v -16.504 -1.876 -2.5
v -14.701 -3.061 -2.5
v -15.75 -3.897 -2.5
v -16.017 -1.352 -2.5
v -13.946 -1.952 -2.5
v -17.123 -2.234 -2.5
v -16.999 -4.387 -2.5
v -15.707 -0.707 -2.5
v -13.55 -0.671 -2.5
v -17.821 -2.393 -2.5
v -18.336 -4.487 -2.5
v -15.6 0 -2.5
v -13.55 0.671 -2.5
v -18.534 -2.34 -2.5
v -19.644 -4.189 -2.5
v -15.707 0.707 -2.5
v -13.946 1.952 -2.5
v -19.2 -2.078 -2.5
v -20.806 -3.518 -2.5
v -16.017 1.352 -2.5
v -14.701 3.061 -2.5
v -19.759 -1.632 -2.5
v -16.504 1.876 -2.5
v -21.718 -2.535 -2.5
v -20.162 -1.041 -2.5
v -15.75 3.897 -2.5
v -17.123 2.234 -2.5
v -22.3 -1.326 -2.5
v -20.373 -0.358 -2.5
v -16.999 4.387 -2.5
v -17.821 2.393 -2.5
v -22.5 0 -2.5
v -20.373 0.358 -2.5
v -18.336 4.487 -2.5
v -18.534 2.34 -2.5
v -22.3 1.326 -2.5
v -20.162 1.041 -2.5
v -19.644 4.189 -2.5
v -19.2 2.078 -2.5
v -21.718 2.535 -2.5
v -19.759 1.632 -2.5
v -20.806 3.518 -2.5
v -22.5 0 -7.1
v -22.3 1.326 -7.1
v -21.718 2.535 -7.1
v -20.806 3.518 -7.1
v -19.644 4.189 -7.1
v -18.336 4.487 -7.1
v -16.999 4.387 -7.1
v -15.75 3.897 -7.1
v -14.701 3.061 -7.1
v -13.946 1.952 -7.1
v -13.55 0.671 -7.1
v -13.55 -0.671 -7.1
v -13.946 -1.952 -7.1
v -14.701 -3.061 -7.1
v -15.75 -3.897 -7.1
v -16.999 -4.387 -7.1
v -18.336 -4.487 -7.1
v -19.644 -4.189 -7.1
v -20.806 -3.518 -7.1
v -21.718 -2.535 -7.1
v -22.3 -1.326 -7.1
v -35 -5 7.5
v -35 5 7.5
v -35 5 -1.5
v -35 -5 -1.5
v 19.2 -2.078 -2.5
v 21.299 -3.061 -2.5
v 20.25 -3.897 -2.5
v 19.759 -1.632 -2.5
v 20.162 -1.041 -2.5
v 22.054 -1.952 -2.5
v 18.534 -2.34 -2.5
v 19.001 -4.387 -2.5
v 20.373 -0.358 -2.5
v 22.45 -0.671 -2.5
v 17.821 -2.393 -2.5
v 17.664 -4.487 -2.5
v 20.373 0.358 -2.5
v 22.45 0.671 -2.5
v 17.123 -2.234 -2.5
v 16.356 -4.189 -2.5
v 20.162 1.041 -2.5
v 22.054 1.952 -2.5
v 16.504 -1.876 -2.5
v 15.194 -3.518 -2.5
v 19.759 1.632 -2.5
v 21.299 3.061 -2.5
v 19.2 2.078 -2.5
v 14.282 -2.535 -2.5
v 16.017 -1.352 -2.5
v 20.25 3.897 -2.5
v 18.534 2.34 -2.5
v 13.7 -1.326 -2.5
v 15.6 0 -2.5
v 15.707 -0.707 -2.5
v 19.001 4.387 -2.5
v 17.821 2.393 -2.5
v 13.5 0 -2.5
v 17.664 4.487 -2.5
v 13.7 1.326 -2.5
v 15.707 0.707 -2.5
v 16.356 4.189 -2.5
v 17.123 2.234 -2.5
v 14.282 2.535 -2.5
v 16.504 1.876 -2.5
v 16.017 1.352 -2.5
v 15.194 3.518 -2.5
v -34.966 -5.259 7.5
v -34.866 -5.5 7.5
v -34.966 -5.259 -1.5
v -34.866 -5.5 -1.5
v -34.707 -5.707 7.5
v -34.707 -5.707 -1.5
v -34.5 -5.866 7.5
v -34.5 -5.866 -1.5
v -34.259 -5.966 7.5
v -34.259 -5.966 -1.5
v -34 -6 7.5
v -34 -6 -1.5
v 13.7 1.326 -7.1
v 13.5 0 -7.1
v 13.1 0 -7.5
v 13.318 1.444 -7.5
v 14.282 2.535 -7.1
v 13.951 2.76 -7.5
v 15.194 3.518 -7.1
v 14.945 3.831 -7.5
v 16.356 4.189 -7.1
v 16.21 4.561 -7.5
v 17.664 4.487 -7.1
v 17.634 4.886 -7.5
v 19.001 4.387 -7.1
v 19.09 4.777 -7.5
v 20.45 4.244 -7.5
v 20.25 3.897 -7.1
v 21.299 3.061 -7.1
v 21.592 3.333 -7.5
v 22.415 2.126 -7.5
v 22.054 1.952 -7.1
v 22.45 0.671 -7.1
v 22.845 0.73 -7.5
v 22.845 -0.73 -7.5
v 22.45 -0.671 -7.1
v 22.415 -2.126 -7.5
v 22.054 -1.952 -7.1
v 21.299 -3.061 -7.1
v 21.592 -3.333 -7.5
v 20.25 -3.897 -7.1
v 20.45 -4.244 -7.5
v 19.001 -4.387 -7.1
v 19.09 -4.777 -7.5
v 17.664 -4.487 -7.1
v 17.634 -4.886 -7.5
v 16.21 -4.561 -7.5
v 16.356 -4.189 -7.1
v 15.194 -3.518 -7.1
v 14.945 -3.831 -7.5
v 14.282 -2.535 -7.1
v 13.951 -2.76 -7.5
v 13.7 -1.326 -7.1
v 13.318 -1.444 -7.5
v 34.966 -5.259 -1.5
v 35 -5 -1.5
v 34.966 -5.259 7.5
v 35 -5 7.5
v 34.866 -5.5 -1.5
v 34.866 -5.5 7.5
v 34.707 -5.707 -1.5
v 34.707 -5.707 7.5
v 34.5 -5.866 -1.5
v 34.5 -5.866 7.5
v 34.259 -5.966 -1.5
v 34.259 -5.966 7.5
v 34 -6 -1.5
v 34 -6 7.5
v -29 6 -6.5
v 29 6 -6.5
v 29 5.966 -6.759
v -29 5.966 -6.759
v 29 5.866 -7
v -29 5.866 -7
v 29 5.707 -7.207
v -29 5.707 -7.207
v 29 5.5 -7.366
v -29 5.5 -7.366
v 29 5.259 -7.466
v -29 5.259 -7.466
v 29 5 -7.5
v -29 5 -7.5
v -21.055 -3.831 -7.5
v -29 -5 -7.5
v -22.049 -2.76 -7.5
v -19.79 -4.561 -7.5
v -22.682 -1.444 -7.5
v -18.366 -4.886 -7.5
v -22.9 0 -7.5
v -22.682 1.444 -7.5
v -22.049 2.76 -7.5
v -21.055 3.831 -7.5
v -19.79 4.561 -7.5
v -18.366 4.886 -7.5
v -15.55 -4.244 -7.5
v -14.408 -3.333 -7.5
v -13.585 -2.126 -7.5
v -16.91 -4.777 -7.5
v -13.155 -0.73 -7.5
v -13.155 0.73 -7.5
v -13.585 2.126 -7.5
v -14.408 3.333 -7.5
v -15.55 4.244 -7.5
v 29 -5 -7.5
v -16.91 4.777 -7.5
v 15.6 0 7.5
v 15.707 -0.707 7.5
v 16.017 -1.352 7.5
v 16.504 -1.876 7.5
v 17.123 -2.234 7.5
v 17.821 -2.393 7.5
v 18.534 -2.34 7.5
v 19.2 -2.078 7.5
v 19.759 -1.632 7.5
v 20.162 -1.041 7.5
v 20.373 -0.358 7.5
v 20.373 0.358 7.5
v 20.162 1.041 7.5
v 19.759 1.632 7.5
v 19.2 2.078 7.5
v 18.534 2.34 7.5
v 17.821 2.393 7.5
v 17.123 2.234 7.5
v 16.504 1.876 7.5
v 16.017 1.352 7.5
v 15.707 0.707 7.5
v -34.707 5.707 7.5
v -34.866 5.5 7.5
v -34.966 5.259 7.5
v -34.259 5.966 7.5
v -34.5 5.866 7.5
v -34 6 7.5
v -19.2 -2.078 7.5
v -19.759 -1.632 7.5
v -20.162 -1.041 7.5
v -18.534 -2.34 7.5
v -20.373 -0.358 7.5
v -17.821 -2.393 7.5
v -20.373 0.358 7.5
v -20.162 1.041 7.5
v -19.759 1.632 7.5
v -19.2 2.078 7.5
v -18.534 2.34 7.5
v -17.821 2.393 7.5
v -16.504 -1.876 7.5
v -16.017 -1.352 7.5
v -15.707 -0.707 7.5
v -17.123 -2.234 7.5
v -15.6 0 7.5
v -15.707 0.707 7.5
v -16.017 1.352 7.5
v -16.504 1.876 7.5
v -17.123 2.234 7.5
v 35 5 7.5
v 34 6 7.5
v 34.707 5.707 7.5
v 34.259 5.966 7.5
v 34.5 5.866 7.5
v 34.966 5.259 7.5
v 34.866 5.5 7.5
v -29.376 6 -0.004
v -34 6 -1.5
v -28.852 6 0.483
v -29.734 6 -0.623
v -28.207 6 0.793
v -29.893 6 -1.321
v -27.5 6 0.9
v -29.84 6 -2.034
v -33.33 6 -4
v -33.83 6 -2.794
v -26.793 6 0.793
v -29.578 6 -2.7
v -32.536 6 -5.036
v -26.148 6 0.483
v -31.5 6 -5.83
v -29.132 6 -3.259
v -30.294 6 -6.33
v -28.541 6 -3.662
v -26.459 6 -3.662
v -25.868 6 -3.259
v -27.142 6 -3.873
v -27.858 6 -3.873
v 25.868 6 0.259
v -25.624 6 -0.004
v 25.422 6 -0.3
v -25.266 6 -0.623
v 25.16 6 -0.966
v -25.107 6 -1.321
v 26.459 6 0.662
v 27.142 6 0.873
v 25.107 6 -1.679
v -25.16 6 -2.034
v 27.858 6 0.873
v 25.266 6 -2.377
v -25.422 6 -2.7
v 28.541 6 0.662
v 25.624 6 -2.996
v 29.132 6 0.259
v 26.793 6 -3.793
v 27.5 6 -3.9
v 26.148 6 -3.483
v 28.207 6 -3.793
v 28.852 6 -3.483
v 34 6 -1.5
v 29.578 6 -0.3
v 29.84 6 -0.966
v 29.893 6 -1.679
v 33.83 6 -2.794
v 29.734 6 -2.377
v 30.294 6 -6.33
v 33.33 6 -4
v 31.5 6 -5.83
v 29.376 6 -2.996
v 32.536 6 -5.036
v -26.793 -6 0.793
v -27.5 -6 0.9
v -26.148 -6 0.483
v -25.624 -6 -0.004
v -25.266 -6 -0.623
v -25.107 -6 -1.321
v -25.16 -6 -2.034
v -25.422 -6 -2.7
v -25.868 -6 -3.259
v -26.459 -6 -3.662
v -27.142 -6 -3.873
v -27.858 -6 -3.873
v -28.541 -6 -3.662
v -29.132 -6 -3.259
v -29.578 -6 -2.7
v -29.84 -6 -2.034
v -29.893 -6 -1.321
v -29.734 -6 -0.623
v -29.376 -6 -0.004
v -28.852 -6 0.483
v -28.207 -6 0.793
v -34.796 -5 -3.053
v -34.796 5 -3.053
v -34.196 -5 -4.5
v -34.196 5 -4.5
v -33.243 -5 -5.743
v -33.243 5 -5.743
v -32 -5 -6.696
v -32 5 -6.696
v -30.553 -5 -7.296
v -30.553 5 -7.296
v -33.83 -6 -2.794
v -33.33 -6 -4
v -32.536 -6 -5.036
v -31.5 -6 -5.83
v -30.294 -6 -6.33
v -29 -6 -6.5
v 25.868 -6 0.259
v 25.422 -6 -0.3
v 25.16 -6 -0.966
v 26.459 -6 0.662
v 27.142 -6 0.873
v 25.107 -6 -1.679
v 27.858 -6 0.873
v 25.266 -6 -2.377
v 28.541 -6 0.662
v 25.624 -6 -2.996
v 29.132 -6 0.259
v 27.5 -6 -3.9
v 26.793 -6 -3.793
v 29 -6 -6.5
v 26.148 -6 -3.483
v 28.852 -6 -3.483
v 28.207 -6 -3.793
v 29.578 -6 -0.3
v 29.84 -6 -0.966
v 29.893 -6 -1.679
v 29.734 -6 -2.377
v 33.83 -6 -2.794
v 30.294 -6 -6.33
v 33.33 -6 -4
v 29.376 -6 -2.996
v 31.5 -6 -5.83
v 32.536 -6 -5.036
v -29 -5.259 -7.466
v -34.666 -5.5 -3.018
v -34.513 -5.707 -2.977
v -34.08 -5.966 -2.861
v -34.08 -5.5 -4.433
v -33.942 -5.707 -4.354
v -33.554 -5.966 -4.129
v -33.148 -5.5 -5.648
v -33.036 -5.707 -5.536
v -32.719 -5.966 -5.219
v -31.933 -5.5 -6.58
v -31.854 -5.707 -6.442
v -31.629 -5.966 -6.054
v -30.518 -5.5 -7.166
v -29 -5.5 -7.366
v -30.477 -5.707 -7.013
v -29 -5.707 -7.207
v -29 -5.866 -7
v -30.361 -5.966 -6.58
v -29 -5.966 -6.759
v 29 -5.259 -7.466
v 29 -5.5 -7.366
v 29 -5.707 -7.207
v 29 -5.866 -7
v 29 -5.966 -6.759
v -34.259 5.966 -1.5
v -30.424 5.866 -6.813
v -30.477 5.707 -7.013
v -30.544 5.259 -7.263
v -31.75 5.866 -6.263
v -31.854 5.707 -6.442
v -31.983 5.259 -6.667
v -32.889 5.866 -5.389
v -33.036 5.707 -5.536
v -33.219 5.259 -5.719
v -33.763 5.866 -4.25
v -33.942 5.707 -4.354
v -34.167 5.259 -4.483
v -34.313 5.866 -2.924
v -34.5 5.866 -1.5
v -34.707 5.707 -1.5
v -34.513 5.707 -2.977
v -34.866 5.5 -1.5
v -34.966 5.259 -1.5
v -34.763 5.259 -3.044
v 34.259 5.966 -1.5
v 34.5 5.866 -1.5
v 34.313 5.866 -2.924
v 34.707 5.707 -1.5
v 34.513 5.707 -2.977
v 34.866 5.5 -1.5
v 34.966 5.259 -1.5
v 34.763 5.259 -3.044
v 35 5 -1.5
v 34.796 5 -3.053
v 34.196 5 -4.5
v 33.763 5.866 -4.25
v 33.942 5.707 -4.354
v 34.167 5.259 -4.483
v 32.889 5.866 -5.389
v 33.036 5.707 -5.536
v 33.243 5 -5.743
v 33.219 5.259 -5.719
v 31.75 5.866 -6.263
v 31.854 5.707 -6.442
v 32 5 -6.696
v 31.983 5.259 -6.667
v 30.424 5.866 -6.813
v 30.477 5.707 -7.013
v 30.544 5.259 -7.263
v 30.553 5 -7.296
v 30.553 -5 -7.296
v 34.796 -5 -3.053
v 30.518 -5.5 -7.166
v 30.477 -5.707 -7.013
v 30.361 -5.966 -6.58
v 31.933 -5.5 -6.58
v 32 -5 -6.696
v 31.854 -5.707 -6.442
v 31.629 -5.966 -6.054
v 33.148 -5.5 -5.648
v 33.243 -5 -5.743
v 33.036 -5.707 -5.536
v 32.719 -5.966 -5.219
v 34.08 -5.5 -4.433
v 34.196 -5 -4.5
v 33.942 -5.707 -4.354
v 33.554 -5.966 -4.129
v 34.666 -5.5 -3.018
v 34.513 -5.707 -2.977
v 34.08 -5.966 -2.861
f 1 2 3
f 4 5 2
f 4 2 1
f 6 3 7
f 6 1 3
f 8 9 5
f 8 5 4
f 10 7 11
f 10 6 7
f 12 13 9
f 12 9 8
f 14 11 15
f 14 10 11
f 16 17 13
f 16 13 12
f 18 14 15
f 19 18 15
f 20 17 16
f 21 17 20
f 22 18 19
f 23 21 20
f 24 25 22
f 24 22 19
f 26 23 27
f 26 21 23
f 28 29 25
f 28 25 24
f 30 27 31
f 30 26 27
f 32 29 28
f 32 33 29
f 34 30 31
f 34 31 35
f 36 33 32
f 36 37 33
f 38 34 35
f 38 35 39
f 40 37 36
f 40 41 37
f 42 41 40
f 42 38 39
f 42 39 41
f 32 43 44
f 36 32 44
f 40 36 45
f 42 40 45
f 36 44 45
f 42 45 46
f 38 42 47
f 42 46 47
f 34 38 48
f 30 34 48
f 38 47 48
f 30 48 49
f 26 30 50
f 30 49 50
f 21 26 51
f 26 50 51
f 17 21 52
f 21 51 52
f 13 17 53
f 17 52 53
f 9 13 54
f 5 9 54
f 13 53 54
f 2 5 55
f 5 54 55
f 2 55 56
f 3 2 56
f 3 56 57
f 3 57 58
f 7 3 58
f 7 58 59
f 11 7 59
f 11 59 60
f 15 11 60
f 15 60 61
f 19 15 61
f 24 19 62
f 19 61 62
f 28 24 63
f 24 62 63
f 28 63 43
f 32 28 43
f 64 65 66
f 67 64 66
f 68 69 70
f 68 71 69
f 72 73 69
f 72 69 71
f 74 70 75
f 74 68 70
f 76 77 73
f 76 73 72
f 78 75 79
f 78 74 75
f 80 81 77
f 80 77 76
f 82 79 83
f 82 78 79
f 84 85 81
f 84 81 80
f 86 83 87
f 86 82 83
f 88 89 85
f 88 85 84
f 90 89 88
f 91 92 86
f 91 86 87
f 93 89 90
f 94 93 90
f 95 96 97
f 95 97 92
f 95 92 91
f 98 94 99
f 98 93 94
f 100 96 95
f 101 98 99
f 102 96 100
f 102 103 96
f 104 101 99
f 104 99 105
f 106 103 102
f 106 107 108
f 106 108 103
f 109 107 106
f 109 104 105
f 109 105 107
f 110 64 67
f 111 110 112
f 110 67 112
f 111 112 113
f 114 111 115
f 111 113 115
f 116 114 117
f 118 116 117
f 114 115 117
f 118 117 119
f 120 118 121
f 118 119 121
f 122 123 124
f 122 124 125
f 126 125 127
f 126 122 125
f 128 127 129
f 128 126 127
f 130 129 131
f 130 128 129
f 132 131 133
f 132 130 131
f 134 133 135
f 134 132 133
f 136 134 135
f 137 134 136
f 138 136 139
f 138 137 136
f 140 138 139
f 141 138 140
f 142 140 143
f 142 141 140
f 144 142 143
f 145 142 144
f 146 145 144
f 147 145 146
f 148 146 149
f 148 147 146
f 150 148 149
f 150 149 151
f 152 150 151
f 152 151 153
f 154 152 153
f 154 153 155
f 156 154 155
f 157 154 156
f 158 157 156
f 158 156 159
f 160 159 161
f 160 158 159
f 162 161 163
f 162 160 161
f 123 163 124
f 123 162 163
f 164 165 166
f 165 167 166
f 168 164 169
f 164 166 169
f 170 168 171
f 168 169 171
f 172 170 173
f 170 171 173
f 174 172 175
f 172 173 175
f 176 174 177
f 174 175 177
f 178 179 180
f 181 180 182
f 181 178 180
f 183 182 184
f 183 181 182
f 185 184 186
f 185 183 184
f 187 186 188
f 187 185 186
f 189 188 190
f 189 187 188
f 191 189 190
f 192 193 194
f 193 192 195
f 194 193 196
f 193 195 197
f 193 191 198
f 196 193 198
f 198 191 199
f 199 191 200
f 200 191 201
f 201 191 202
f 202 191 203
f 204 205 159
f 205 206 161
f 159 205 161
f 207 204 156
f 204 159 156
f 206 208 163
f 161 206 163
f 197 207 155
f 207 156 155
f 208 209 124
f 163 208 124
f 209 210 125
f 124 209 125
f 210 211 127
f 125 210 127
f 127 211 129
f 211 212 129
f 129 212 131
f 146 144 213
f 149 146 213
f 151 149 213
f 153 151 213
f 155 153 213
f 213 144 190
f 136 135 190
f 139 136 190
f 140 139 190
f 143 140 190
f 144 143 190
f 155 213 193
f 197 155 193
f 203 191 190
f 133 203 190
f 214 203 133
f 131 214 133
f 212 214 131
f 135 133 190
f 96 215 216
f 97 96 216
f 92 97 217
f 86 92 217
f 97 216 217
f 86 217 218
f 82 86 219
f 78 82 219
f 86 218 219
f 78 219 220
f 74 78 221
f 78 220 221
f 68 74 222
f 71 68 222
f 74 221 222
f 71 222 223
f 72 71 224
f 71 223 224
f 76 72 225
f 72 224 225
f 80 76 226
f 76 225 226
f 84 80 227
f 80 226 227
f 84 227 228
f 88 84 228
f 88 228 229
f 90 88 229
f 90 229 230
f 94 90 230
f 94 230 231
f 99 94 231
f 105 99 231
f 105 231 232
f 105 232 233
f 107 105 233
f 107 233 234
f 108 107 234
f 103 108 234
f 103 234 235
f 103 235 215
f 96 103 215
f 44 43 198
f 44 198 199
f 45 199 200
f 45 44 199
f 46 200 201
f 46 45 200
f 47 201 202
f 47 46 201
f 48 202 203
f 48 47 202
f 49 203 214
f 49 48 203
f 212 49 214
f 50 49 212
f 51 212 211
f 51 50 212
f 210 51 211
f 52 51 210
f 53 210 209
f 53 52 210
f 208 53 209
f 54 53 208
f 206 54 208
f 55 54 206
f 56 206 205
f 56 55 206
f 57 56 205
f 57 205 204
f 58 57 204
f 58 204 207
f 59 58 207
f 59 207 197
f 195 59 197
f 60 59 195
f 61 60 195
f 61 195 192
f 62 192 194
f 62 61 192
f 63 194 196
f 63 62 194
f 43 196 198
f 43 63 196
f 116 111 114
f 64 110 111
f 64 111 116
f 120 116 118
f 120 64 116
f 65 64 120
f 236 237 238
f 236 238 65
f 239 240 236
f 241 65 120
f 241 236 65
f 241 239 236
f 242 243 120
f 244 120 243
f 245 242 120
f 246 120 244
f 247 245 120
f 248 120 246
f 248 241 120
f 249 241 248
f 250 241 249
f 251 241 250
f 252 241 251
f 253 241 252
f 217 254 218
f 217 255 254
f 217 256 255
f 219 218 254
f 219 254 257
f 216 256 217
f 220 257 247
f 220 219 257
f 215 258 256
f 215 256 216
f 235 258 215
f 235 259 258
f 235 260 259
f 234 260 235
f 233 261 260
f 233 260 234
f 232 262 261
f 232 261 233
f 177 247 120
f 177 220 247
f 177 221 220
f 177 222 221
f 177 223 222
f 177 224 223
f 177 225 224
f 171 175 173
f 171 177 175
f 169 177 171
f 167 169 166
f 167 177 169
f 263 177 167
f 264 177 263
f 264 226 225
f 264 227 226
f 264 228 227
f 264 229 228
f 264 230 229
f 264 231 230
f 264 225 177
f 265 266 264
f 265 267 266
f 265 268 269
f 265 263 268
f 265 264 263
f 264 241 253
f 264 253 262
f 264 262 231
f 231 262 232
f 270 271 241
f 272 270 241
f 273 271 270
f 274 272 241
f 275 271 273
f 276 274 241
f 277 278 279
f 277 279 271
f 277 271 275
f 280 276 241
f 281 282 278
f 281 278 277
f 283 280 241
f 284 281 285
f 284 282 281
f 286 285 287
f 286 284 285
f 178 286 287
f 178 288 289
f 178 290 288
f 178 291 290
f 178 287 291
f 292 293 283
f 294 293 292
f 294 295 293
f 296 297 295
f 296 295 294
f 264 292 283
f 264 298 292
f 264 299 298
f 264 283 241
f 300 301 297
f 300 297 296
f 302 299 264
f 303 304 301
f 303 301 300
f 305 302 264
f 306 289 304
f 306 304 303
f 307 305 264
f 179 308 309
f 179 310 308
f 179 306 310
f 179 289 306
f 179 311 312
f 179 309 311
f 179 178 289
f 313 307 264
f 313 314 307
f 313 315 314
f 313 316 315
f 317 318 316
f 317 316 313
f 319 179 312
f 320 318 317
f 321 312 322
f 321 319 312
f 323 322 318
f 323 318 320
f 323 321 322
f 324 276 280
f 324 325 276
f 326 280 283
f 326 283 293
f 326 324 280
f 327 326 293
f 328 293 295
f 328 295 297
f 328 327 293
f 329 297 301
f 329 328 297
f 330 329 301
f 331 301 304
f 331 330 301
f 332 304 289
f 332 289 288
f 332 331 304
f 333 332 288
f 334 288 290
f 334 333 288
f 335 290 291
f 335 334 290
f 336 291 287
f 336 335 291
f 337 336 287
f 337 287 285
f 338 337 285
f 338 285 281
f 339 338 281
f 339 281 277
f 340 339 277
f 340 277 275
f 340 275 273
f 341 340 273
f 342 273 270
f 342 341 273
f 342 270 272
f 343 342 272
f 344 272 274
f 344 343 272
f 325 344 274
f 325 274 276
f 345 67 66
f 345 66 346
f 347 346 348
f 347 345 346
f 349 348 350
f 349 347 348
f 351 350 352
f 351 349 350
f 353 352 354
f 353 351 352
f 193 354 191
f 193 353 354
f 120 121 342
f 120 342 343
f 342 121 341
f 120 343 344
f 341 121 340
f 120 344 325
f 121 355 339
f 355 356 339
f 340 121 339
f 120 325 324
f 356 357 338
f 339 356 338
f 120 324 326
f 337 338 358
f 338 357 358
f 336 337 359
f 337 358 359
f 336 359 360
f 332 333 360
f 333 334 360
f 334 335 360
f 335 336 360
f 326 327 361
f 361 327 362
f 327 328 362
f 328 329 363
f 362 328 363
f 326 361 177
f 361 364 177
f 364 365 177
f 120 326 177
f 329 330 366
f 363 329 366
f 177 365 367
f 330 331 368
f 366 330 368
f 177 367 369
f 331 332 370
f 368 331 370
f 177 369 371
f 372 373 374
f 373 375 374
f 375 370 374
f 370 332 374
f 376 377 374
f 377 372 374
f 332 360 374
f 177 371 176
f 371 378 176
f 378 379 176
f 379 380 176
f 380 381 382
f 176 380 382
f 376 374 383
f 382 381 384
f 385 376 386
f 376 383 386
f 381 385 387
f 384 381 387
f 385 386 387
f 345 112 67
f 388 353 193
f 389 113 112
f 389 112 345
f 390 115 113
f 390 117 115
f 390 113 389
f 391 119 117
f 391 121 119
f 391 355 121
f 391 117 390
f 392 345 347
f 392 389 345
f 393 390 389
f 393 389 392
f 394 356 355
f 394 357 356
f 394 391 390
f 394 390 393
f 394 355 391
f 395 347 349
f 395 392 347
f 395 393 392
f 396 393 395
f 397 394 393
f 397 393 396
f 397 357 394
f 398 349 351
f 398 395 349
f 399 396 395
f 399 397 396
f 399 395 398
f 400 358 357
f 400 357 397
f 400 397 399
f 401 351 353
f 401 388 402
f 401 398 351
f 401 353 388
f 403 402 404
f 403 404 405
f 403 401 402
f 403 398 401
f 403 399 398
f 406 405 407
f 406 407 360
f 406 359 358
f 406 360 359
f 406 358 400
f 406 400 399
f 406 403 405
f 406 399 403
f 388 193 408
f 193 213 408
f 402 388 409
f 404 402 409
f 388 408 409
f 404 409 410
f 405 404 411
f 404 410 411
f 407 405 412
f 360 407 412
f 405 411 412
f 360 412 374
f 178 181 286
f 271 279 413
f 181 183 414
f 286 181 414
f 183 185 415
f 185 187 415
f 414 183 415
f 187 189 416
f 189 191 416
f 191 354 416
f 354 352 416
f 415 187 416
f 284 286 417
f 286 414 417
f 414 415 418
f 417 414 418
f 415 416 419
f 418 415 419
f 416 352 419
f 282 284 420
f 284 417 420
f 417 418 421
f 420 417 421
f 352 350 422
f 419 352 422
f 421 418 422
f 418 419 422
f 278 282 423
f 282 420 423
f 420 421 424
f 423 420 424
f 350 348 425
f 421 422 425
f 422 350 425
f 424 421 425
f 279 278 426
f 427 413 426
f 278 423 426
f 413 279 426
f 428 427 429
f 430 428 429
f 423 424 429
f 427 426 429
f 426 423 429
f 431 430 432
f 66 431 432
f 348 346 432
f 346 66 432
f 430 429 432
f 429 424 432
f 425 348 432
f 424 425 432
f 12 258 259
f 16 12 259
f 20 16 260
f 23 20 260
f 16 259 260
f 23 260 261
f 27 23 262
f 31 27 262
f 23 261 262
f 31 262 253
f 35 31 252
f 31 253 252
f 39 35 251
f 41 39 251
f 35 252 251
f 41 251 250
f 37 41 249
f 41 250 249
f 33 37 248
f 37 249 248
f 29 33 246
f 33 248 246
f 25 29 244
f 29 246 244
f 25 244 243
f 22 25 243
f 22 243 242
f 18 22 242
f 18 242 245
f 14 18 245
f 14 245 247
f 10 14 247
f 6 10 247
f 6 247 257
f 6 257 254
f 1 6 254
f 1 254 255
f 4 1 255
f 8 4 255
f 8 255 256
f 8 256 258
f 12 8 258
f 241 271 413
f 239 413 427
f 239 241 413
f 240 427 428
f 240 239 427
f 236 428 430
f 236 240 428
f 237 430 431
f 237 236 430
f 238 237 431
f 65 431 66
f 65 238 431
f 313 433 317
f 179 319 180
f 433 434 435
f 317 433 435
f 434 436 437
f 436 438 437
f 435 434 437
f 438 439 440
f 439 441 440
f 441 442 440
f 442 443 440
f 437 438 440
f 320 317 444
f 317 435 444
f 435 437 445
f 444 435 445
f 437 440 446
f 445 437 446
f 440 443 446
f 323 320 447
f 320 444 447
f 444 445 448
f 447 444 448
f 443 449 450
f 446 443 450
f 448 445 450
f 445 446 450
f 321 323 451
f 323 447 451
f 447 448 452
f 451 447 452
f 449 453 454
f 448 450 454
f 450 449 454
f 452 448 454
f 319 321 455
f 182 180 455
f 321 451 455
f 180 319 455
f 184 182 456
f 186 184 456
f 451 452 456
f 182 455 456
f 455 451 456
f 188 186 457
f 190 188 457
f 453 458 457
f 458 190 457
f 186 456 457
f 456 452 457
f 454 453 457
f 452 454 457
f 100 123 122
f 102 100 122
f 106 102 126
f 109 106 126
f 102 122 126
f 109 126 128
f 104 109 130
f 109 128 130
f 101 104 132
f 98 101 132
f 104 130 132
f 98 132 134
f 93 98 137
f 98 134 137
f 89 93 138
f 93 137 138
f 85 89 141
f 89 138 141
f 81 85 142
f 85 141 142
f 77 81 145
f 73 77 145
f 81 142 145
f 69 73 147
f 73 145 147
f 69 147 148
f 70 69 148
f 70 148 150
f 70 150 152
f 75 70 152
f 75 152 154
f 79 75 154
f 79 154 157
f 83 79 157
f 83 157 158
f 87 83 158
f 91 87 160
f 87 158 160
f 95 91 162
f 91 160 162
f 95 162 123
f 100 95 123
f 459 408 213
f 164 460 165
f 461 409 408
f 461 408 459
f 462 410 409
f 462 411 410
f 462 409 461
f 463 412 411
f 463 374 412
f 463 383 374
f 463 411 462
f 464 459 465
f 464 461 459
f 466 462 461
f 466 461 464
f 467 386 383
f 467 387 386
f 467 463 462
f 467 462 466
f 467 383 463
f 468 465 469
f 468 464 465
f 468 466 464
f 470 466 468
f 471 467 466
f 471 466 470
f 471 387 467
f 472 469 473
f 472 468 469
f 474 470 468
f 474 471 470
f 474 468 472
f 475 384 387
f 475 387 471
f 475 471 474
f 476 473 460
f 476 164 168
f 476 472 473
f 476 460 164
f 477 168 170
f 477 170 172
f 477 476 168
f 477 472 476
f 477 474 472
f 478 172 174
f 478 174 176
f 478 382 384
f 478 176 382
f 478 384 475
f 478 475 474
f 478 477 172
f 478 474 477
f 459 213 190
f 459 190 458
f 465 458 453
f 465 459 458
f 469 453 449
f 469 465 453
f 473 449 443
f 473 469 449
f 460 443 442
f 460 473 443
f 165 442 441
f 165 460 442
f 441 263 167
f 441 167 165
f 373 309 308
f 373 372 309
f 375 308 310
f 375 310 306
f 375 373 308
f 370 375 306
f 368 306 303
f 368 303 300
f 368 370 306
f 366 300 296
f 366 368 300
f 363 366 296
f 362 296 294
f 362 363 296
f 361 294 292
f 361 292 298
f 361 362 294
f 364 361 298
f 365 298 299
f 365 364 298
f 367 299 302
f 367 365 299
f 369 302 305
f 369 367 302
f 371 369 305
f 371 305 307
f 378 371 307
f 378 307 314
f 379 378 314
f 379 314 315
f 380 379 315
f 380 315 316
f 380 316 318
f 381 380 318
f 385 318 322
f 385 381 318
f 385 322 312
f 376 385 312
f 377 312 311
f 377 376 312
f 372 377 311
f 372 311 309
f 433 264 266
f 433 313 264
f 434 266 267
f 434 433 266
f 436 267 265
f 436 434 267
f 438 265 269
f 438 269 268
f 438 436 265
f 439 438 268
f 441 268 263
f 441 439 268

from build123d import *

# Parameters (mm, degrees)
SKETCH2_W           = 70
SKETCH2_H           = 15
SKETCH2_R           = 2.4
BOSS_EXTRUDE1_DEPTH = 6
SKETCH4_R           = 2.4
CUT_EXTRUDE1_DEPTH  = 39.548670535
FILLET1_R           = 6
FILLET2_R           = 1
SKETCH5_R           = 4.5
CUT_EXTRUDE2_DEPTH  = 5
CHAMFER1_SIZE       = 0.4


with BuildPart() as part:
    # Sketch2 → Boss-Extrude1 (new, symmetric)
    with BuildSketch(Plane(origin=(0, 0, 0), x_dir=(1, 0, 0), z_dir=(0, 1, 0))):
        Rectangle(SKETCH2_W, SKETCH2_H)
        with Locations(Location((-27.5, 1.5, 0), (0, 0, 270))):
            Circle(SKETCH2_R, mode=Mode.SUBTRACT)
        with Locations(Location((27.5, 1.5, 0), (0, 0, 90))):
            Circle(SKETCH2_R, mode=Mode.SUBTRACT)
    extrude(amount=BOSS_EXTRUDE1_DEPTH, both=True)

    # Sketch4 → Cut-Extrude1 (cut, through all)
    with BuildSketch(Plane.XY.offset(7.5)):
        with Locations((-18, 0)):
            Circle(SKETCH4_R)
        with Locations(Location((18, 0, 0), (0, 0, 180))):
            Circle(SKETCH4_R)
    extrude(amount=-CUT_EXTRUDE1_DEPTH, mode=Mode.SUBTRACT)

    # Fillet1
    fillet1_edges = [part.edges().sort_by_distance(p)[0] for p in [
        (-35, 0, -7.5),
        (35, 0, -7.5),
    ]]
    fillet(fillet1_edges, radius=FILLET1_R)

    # Fillet2
    fillet2_edges = [part.edges().sort_by_distance(p)[0] for p in [
        (35, 6, 3),
        (-35, -6, 3),
        (-35, 6, 3),
        (0, -6, -7.5),
        (33.242640687, -6, -5.742640687),
        (-33.242640687, -6, -5.742640687),
        (0, 6, -7.5),
        (33.242640687, 6, -5.742640687),
        (-33.242640687, 6, -5.742640687),
        (35, -6, 3),
    ]]
    fillet(fillet2_edges, radius=FILLET2_R)

    # Sketch5 → Cut-Extrude2 (cut)
    with BuildSketch(Plane(origin=(0, 0, -7.5), x_dir=(-1, 0, 0), z_dir=(0, 0, -1))):
        with Locations((-18, 0)):
            Circle(SKETCH5_R)
        with Locations((18, 0)):
            Circle(SKETCH5_R)
    extrude(amount=-CUT_EXTRUDE2_DEPTH, mode=Mode.SUBTRACT)

    # Chamfer1
    chamfer1_edges = [part.edges().sort_by_distance(p)[0] for p in [
        (22.5, 0, -7.5),
        (-13.5, 0, -7.5),
    ]]
    chamfer(chamfer1_edges, length=CHAMFER1_SIZE)


solid = part.part
